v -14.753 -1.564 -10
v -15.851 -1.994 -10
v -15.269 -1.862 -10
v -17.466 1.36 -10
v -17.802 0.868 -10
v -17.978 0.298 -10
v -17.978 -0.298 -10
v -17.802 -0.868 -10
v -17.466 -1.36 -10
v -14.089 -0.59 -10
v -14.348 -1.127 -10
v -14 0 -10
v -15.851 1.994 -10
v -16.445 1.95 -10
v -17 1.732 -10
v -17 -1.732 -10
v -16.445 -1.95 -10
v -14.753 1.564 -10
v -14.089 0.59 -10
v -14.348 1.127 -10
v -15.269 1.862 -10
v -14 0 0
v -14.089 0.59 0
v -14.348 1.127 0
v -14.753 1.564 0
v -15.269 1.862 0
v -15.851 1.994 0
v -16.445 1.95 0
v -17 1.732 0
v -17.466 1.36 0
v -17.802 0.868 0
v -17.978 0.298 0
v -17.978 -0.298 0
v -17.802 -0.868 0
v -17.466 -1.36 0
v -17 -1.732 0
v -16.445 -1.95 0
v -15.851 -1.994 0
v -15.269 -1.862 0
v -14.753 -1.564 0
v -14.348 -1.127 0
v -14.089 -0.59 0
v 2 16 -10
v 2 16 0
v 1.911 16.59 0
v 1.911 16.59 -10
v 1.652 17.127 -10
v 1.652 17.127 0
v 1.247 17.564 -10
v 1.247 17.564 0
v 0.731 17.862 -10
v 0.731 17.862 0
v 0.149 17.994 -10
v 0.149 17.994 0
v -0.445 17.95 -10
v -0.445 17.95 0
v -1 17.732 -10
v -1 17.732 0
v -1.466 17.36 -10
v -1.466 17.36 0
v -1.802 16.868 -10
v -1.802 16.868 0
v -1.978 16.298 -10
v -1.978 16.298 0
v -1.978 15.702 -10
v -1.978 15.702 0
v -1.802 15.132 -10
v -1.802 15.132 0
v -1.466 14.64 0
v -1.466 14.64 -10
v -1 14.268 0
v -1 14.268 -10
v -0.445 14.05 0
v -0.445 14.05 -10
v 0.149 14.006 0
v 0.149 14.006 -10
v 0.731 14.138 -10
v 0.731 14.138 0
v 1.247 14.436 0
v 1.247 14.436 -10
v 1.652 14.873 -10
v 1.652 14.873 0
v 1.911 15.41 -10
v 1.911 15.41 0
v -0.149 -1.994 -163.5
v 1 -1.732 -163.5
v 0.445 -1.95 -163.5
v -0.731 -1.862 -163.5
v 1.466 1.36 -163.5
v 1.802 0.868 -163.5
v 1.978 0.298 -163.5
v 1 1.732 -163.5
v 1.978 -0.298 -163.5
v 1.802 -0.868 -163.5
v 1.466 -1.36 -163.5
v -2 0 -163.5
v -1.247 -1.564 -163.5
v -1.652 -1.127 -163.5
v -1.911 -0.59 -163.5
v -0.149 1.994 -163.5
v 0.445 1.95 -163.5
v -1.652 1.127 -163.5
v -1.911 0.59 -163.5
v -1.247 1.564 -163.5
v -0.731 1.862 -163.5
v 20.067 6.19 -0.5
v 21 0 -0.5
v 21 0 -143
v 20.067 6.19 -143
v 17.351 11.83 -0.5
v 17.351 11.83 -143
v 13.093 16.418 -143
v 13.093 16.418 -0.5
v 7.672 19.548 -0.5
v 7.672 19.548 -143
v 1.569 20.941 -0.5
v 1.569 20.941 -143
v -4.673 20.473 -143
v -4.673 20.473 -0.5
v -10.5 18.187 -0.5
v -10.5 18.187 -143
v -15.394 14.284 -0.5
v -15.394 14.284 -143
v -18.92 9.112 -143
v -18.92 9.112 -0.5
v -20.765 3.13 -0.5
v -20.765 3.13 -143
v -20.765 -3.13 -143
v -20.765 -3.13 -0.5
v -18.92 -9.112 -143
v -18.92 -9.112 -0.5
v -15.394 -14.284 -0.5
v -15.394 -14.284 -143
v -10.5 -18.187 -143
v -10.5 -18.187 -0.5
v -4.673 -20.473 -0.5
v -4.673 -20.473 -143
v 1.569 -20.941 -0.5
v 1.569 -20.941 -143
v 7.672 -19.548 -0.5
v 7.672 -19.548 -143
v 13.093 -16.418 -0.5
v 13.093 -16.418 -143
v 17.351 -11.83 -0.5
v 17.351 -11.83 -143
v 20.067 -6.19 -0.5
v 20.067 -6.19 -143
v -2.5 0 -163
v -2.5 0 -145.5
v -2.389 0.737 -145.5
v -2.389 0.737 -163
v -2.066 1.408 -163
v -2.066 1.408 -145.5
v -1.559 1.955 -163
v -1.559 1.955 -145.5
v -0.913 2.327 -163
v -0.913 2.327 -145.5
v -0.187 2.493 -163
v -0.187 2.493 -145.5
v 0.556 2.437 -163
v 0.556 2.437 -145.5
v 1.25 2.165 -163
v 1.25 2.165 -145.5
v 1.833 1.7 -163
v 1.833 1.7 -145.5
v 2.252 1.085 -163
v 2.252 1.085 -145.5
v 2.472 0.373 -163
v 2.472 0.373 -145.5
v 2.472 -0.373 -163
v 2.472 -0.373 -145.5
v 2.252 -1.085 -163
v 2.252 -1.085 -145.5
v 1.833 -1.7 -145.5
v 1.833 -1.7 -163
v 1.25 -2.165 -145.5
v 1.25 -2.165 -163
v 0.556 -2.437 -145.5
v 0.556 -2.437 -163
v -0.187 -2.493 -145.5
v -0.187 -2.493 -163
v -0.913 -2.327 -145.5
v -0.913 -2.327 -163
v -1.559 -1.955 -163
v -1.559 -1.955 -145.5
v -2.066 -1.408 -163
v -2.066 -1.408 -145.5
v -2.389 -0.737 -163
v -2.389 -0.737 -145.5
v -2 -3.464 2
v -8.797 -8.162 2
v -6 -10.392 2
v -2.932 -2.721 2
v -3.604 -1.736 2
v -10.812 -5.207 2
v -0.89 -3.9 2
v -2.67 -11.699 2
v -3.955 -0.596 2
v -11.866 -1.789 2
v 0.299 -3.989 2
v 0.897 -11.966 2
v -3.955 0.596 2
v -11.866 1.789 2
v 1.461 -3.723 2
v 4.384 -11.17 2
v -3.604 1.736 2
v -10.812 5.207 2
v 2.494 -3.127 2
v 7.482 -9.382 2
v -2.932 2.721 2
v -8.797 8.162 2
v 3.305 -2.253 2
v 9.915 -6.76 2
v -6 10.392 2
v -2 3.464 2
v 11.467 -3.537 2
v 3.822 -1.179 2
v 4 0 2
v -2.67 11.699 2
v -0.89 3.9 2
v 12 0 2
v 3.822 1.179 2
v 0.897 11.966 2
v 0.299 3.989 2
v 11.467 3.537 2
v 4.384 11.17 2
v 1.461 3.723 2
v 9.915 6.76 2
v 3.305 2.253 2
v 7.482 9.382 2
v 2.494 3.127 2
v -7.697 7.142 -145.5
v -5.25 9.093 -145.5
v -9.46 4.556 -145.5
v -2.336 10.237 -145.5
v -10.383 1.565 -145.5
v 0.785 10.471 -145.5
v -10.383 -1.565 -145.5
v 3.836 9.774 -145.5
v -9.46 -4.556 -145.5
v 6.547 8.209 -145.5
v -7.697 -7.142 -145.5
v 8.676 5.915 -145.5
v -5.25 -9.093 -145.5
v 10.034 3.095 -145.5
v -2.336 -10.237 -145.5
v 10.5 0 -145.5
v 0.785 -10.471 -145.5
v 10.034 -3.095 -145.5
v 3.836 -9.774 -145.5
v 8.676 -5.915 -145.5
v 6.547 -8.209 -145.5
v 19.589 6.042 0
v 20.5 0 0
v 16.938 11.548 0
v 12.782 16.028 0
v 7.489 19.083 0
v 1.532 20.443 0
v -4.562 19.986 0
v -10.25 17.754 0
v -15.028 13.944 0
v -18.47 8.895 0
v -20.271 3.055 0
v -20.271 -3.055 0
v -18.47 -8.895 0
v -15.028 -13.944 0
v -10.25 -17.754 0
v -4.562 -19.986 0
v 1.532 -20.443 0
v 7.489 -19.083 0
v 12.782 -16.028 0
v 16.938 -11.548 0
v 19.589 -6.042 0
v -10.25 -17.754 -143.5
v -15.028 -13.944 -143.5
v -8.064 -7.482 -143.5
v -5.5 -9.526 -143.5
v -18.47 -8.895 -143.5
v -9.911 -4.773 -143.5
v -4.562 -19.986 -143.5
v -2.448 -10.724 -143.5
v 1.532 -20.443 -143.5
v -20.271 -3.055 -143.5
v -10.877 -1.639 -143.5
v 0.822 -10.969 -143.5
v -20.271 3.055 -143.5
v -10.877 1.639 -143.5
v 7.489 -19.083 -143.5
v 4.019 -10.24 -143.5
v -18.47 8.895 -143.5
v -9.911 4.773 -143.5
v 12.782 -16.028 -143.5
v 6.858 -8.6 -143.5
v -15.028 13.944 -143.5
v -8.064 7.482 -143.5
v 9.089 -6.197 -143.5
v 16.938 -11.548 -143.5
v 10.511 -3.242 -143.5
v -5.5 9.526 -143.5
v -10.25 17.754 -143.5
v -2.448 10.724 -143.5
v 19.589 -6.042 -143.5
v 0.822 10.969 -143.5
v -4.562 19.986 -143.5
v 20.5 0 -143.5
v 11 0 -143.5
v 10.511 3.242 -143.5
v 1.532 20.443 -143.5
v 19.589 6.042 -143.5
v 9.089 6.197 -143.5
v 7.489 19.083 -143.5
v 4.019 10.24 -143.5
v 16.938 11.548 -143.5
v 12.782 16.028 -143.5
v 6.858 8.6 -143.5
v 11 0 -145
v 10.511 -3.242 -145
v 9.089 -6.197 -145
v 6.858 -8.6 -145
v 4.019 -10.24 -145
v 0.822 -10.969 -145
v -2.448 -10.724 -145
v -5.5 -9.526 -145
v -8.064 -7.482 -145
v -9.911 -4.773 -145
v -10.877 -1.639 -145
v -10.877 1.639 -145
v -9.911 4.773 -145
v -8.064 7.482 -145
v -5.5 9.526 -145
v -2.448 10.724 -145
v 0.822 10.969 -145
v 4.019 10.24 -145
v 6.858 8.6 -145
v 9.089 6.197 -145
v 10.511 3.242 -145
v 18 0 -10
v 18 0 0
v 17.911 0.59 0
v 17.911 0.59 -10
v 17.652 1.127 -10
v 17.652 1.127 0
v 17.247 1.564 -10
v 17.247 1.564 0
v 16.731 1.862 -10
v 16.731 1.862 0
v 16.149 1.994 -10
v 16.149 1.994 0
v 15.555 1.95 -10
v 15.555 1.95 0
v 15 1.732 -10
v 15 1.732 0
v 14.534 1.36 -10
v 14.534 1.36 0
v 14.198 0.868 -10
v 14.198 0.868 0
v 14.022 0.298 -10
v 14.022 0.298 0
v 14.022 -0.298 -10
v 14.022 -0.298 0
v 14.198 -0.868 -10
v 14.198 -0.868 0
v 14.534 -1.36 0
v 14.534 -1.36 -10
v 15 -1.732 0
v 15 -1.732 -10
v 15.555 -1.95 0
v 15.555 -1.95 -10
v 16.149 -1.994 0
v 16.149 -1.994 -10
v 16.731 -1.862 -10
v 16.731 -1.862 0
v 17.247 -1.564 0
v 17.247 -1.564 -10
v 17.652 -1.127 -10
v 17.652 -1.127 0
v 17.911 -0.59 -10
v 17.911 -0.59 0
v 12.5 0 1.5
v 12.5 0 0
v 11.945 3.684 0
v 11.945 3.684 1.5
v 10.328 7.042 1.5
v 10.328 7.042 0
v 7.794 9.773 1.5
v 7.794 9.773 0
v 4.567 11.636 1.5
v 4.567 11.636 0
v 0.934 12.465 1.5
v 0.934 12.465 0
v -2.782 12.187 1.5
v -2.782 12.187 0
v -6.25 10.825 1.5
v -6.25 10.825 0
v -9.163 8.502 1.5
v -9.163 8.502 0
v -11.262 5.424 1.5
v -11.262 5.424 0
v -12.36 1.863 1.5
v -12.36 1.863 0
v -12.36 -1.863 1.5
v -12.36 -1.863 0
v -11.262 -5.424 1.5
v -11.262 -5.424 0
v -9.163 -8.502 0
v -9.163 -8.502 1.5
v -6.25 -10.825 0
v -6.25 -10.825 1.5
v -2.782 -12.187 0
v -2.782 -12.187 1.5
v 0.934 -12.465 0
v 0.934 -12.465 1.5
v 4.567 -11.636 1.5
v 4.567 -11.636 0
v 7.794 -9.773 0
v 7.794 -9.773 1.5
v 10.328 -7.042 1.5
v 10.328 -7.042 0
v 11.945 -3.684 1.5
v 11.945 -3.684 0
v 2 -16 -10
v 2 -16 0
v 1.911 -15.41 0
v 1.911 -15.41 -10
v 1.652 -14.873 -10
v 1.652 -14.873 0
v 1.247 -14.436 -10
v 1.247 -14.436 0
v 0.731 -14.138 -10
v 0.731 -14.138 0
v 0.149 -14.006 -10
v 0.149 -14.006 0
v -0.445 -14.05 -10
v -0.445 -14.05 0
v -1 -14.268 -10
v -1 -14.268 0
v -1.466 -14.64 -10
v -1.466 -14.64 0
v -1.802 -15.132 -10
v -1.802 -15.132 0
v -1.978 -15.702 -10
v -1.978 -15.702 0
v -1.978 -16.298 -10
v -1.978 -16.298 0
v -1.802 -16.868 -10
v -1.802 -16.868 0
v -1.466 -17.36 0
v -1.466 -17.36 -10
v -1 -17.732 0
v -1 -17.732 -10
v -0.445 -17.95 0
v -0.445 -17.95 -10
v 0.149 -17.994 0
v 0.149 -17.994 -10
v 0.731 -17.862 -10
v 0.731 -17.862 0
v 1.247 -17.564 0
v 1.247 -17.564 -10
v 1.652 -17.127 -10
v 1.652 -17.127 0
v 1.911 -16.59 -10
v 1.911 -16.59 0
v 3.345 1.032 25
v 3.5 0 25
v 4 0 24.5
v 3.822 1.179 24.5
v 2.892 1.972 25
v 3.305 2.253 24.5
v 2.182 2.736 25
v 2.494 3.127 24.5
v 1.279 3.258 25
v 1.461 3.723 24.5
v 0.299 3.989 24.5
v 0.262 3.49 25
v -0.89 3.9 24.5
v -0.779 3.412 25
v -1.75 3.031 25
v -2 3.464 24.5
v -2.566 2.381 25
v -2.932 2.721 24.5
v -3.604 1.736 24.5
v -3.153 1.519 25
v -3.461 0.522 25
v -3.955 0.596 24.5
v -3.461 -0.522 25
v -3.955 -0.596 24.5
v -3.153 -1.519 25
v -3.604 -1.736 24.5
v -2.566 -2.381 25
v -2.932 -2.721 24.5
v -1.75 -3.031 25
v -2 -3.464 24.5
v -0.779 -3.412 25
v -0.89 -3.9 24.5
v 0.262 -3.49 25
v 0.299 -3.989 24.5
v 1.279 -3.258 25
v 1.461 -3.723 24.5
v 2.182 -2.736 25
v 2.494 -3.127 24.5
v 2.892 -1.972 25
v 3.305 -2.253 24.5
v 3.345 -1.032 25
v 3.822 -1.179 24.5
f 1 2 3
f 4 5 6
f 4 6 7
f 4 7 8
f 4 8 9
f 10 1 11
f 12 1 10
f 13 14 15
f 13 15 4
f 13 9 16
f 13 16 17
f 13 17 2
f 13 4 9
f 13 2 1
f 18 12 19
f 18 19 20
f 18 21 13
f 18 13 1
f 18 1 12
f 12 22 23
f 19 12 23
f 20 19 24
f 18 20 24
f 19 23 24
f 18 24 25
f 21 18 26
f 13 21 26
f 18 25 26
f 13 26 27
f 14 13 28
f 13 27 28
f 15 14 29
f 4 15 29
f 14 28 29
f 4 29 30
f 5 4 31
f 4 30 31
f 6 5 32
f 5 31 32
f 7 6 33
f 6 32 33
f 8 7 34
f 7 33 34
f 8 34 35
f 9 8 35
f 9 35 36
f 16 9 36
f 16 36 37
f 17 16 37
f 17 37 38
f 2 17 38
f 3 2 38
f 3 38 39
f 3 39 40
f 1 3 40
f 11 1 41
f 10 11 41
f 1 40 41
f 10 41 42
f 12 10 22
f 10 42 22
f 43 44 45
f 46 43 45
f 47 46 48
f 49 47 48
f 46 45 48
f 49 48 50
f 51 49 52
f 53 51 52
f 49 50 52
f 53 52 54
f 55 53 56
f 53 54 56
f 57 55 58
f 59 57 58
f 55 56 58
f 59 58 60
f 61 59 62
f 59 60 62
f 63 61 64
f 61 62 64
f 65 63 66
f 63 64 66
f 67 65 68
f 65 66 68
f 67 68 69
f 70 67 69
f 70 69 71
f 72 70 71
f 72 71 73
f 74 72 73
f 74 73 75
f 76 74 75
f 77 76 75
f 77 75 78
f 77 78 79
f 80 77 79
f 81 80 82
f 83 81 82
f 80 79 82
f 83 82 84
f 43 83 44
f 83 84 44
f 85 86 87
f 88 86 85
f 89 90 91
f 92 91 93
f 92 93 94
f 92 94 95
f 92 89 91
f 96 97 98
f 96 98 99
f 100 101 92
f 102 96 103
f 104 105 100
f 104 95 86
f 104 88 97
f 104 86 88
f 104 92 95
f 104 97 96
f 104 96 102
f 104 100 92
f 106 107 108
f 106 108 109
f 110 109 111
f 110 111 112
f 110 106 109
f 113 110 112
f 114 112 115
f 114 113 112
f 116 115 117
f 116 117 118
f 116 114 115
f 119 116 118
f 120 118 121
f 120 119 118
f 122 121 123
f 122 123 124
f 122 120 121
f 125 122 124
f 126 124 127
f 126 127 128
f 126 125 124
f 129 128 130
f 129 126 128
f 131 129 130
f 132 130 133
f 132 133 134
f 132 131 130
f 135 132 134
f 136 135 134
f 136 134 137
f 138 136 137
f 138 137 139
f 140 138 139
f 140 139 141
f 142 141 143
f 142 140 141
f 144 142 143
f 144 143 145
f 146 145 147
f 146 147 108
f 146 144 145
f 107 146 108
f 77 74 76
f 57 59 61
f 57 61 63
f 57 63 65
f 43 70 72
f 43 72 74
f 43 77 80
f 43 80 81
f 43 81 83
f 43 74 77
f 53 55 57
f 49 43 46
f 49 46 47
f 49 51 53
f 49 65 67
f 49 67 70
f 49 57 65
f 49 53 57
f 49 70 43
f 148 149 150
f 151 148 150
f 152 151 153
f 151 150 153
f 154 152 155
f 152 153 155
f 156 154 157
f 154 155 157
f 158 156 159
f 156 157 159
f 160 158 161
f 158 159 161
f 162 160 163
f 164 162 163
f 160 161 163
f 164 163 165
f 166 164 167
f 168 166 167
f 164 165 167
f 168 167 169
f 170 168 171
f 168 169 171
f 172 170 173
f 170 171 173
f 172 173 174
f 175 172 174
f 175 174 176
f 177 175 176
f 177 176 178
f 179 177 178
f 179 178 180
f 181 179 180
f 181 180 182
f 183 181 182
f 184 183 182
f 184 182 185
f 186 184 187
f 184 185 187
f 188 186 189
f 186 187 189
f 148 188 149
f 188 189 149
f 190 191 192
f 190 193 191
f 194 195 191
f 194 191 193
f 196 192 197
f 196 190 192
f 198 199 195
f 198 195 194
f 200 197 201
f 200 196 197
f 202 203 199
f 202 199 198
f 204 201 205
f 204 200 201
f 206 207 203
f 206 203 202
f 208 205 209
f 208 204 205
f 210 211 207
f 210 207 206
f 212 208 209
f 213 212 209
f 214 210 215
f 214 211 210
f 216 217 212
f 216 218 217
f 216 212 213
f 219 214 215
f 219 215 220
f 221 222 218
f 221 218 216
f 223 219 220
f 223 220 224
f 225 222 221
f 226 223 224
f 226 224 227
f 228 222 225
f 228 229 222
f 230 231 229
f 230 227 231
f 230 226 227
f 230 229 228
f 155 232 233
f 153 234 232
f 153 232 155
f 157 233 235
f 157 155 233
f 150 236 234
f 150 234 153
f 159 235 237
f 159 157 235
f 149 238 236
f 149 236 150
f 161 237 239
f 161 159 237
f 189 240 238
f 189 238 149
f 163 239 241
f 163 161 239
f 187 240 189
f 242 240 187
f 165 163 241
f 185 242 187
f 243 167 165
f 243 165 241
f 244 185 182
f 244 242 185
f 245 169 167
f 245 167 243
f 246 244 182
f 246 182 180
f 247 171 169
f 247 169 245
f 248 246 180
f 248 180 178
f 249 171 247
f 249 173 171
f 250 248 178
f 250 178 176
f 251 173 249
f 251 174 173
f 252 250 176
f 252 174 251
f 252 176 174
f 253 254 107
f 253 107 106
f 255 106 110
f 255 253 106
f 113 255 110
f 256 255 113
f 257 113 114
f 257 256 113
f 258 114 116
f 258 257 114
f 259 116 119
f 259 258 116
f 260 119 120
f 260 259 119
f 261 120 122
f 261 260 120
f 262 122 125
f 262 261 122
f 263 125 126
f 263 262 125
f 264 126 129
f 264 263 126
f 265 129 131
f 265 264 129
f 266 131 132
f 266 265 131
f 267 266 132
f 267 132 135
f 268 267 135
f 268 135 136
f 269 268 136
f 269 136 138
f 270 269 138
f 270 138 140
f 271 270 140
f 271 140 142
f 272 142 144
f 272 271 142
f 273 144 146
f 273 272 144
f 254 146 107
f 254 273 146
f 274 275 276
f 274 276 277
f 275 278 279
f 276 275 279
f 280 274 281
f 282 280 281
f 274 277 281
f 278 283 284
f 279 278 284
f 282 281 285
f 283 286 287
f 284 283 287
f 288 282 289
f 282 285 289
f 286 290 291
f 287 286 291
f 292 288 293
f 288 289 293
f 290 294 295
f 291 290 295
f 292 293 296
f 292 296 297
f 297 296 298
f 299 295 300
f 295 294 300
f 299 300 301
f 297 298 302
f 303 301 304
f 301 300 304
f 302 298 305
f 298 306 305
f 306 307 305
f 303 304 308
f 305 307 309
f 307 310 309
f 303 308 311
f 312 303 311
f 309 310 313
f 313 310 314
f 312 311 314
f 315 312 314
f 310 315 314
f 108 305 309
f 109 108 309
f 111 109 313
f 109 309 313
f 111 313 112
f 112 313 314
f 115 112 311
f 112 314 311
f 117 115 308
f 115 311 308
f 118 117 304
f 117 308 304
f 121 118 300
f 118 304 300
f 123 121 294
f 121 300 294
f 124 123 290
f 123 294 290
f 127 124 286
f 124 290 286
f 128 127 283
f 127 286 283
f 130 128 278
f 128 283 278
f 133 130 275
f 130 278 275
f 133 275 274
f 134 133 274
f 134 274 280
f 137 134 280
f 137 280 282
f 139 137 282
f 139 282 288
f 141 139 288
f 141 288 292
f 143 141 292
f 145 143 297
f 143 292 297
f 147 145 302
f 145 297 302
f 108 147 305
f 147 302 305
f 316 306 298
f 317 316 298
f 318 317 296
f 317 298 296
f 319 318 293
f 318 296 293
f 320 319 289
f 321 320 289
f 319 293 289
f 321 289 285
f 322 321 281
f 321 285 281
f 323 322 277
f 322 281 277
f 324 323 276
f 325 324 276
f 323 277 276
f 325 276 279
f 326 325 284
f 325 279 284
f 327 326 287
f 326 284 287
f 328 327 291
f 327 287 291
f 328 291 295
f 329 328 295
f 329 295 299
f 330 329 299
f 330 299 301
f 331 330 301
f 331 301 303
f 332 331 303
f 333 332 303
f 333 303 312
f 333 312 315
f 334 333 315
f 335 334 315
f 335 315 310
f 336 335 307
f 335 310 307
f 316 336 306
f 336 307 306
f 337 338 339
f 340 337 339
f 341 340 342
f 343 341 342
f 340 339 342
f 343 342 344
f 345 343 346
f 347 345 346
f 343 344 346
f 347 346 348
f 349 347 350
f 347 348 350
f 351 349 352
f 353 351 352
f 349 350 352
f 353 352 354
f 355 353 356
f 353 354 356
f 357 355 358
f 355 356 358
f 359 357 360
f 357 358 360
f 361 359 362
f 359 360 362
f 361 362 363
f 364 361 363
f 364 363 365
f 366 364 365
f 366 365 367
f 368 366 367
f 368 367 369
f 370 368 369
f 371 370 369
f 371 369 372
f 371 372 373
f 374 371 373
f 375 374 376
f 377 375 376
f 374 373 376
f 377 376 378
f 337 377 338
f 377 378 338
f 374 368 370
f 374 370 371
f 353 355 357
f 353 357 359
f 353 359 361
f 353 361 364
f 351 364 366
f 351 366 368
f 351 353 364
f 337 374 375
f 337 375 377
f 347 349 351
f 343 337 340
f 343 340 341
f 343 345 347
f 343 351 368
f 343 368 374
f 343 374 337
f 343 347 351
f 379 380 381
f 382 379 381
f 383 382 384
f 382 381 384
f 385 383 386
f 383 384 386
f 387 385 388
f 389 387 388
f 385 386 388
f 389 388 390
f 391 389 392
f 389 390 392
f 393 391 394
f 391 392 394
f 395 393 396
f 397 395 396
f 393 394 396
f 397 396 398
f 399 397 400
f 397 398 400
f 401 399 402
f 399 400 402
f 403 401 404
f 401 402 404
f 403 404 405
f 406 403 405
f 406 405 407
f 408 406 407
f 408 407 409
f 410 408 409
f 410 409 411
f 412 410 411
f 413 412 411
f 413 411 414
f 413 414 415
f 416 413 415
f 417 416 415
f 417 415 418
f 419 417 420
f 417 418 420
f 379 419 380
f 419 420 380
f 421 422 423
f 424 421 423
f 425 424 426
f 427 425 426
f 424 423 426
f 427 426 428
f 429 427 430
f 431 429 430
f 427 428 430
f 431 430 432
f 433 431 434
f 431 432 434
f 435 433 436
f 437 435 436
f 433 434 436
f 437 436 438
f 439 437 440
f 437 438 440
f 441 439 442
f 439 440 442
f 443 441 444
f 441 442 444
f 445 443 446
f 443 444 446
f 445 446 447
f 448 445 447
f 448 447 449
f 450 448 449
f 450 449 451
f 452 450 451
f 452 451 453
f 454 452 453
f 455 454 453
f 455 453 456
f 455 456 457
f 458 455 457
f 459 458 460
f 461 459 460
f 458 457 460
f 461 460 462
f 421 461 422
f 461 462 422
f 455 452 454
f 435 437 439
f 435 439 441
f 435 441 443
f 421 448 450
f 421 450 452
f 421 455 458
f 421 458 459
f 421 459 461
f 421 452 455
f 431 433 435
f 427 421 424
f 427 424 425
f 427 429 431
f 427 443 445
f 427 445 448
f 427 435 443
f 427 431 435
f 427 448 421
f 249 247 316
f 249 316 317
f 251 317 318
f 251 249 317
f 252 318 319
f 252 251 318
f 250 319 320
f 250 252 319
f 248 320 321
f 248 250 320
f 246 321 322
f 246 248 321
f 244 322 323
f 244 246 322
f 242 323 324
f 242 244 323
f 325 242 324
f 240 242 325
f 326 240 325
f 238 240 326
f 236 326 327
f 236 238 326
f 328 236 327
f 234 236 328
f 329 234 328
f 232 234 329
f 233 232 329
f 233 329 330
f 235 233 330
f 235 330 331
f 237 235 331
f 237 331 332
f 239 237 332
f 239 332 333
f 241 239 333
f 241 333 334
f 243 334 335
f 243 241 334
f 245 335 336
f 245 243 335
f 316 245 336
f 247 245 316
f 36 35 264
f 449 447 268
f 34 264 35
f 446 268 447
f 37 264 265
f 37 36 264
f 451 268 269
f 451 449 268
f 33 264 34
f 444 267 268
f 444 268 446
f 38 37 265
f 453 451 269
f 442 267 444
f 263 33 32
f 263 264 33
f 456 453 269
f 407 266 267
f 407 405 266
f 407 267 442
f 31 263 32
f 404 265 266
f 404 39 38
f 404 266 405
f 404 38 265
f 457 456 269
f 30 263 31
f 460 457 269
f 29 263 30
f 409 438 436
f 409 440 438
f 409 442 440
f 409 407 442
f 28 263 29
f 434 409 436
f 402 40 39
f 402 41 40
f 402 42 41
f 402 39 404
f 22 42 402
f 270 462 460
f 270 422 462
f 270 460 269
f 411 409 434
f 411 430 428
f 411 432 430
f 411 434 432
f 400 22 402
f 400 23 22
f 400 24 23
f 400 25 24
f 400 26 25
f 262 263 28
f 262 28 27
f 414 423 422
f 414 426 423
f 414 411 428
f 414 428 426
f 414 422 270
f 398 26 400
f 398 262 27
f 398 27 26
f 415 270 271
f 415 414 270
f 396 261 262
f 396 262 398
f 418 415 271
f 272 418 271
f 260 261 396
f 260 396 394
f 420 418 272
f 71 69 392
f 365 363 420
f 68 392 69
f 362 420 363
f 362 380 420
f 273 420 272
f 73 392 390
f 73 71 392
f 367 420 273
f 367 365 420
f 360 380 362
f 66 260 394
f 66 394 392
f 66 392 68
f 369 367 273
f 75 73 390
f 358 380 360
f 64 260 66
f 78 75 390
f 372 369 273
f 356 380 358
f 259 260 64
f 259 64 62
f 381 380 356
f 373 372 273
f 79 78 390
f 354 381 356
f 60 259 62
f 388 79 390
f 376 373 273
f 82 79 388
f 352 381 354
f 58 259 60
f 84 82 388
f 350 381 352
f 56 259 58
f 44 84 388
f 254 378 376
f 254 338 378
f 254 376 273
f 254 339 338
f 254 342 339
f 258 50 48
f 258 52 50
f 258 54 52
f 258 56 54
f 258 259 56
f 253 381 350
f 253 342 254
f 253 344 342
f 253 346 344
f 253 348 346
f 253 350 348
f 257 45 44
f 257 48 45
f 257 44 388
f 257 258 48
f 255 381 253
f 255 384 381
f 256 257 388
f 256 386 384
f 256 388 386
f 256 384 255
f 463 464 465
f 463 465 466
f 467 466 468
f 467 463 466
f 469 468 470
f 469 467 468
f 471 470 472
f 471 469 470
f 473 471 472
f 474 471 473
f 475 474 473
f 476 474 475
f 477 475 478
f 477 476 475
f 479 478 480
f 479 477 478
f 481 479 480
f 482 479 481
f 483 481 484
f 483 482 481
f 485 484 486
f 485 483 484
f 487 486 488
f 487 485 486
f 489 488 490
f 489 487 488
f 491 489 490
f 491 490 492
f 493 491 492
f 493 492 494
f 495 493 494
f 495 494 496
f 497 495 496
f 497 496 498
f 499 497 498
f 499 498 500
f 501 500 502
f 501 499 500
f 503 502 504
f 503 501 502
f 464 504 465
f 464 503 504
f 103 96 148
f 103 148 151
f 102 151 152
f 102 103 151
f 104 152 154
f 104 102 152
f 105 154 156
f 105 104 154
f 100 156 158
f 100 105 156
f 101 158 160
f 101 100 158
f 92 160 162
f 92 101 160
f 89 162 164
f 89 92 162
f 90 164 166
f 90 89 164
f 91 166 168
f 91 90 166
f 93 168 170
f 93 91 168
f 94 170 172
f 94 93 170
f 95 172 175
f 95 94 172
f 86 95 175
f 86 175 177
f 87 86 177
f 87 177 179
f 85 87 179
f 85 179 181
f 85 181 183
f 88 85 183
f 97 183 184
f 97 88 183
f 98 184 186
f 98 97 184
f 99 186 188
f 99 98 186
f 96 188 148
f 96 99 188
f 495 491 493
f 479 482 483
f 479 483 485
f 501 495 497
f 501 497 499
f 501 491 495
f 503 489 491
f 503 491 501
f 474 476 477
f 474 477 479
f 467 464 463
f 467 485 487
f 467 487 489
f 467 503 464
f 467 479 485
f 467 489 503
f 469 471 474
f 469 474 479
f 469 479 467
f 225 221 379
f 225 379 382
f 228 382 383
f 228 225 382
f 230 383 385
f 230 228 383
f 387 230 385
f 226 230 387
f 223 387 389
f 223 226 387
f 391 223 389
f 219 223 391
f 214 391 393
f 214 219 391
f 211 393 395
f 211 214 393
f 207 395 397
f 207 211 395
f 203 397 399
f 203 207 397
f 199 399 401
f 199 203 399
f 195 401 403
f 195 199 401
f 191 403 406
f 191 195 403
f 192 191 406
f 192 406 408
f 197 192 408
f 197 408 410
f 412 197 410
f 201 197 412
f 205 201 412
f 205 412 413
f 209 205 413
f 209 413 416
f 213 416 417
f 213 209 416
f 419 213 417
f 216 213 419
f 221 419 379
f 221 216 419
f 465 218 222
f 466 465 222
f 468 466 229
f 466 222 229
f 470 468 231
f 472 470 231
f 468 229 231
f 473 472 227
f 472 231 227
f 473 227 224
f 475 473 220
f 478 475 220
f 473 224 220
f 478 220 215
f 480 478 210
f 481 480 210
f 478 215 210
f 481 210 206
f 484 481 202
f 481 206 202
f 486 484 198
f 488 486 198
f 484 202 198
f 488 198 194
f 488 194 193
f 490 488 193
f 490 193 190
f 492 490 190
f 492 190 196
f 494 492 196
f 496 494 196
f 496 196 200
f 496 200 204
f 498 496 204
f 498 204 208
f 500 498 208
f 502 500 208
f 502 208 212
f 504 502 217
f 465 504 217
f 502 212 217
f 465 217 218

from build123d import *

# Parameters (mm, degrees)
ESQUISSE1_R          = 21
BASE_EXTRUSION_DEPTH = 143.5
ESQUISSE2_R          = 12.5
BOSS_EXTRU_1_DEPTH   = 2
ESQUISSE3_R          = 4
BOSS_EXTRU_2_DEPTH   = 23
ESQUISSE4_R          = 11
BOSS_EXTRU_3_DEPTH   = 2
ESQUISSE5_R          = 2.5
BOSS_EXTRU_4_DEPTH   = 18
CHANFREIN1_SIZE      = 0.5
SKETCH1_R            = 2
EXTRUDE1_DEPTH       = 10


with BuildPart() as part:
    # Esquisse1 → Base-Extrusion (new body)
    with BuildSketch(Plane.XY):
        Circle(ESQUISSE1_R)
    extrude(amount=-BASE_EXTRUSION_DEPTH)

    # Esquisse2 → Boss.-Extru.1 (add)
    with BuildSketch(Plane.XY):
        Circle(ESQUISSE2_R)
    extrude(amount=BOSS_EXTRU_1_DEPTH)

    # Esquisse3 → Boss.-Extru.2 (add)
    with BuildSketch(Plane.XY.offset(2)):
        Circle(ESQUISSE3_R)
    extrude(amount=BOSS_EXTRU_2_DEPTH)

    # Esquisse4 → Boss.-Extru.3 (add)
    with BuildSketch(Plane(origin=(0, 0, -143.5), x_dir=(-1, 0, 0), z_dir=(0, 0, -1))):
        with Locations(Location((0, 0, 0), (0, 0, 180))):
            Circle(ESQUISSE4_R)
    extrude(amount=BOSS_EXTRU_3_DEPTH)

    # Esquisse5 → Boss.-Extru.4 (add)
    with BuildSketch(Plane(origin=(0, 0, -145.5), x_dir=(-1, 0, 0), z_dir=(0, 0, -1))):
        Circle(ESQUISSE5_R)
    extrude(amount=BOSS_EXTRU_4_DEPTH)

    # Chanfrein1
    chanfrein1_edges = [part.edges().sort_by_distance(p)[0] for p in [
        (-11, 0, -145.5),
        (2.5, 0, -163.5),
        (-21, 0, 0),
        (-21, 0, -143.5),
        (-12.5, 0, 2),
        (-4, 0, 25),
    ]]
    chamfer(chanfrein1_edges, length=CHANFREIN1_SIZE)

    # Sketch1 → Extrude1 (cut)
    with BuildSketch(Plane.XY):
        with Locations((0, 16)):
            Circle(SKETCH1_R)
        with Locations((16, 0)):
            Circle(SKETCH1_R)
        with Locations((0, -16)):
            Circle(SKETCH1_R)
        with Locations((-16, 0)):
            Circle(SKETCH1_R)
    extrude(amount=-EXTRUDE1_DEPTH, mode=Mode.SUBTRACT)


solid = part.part
